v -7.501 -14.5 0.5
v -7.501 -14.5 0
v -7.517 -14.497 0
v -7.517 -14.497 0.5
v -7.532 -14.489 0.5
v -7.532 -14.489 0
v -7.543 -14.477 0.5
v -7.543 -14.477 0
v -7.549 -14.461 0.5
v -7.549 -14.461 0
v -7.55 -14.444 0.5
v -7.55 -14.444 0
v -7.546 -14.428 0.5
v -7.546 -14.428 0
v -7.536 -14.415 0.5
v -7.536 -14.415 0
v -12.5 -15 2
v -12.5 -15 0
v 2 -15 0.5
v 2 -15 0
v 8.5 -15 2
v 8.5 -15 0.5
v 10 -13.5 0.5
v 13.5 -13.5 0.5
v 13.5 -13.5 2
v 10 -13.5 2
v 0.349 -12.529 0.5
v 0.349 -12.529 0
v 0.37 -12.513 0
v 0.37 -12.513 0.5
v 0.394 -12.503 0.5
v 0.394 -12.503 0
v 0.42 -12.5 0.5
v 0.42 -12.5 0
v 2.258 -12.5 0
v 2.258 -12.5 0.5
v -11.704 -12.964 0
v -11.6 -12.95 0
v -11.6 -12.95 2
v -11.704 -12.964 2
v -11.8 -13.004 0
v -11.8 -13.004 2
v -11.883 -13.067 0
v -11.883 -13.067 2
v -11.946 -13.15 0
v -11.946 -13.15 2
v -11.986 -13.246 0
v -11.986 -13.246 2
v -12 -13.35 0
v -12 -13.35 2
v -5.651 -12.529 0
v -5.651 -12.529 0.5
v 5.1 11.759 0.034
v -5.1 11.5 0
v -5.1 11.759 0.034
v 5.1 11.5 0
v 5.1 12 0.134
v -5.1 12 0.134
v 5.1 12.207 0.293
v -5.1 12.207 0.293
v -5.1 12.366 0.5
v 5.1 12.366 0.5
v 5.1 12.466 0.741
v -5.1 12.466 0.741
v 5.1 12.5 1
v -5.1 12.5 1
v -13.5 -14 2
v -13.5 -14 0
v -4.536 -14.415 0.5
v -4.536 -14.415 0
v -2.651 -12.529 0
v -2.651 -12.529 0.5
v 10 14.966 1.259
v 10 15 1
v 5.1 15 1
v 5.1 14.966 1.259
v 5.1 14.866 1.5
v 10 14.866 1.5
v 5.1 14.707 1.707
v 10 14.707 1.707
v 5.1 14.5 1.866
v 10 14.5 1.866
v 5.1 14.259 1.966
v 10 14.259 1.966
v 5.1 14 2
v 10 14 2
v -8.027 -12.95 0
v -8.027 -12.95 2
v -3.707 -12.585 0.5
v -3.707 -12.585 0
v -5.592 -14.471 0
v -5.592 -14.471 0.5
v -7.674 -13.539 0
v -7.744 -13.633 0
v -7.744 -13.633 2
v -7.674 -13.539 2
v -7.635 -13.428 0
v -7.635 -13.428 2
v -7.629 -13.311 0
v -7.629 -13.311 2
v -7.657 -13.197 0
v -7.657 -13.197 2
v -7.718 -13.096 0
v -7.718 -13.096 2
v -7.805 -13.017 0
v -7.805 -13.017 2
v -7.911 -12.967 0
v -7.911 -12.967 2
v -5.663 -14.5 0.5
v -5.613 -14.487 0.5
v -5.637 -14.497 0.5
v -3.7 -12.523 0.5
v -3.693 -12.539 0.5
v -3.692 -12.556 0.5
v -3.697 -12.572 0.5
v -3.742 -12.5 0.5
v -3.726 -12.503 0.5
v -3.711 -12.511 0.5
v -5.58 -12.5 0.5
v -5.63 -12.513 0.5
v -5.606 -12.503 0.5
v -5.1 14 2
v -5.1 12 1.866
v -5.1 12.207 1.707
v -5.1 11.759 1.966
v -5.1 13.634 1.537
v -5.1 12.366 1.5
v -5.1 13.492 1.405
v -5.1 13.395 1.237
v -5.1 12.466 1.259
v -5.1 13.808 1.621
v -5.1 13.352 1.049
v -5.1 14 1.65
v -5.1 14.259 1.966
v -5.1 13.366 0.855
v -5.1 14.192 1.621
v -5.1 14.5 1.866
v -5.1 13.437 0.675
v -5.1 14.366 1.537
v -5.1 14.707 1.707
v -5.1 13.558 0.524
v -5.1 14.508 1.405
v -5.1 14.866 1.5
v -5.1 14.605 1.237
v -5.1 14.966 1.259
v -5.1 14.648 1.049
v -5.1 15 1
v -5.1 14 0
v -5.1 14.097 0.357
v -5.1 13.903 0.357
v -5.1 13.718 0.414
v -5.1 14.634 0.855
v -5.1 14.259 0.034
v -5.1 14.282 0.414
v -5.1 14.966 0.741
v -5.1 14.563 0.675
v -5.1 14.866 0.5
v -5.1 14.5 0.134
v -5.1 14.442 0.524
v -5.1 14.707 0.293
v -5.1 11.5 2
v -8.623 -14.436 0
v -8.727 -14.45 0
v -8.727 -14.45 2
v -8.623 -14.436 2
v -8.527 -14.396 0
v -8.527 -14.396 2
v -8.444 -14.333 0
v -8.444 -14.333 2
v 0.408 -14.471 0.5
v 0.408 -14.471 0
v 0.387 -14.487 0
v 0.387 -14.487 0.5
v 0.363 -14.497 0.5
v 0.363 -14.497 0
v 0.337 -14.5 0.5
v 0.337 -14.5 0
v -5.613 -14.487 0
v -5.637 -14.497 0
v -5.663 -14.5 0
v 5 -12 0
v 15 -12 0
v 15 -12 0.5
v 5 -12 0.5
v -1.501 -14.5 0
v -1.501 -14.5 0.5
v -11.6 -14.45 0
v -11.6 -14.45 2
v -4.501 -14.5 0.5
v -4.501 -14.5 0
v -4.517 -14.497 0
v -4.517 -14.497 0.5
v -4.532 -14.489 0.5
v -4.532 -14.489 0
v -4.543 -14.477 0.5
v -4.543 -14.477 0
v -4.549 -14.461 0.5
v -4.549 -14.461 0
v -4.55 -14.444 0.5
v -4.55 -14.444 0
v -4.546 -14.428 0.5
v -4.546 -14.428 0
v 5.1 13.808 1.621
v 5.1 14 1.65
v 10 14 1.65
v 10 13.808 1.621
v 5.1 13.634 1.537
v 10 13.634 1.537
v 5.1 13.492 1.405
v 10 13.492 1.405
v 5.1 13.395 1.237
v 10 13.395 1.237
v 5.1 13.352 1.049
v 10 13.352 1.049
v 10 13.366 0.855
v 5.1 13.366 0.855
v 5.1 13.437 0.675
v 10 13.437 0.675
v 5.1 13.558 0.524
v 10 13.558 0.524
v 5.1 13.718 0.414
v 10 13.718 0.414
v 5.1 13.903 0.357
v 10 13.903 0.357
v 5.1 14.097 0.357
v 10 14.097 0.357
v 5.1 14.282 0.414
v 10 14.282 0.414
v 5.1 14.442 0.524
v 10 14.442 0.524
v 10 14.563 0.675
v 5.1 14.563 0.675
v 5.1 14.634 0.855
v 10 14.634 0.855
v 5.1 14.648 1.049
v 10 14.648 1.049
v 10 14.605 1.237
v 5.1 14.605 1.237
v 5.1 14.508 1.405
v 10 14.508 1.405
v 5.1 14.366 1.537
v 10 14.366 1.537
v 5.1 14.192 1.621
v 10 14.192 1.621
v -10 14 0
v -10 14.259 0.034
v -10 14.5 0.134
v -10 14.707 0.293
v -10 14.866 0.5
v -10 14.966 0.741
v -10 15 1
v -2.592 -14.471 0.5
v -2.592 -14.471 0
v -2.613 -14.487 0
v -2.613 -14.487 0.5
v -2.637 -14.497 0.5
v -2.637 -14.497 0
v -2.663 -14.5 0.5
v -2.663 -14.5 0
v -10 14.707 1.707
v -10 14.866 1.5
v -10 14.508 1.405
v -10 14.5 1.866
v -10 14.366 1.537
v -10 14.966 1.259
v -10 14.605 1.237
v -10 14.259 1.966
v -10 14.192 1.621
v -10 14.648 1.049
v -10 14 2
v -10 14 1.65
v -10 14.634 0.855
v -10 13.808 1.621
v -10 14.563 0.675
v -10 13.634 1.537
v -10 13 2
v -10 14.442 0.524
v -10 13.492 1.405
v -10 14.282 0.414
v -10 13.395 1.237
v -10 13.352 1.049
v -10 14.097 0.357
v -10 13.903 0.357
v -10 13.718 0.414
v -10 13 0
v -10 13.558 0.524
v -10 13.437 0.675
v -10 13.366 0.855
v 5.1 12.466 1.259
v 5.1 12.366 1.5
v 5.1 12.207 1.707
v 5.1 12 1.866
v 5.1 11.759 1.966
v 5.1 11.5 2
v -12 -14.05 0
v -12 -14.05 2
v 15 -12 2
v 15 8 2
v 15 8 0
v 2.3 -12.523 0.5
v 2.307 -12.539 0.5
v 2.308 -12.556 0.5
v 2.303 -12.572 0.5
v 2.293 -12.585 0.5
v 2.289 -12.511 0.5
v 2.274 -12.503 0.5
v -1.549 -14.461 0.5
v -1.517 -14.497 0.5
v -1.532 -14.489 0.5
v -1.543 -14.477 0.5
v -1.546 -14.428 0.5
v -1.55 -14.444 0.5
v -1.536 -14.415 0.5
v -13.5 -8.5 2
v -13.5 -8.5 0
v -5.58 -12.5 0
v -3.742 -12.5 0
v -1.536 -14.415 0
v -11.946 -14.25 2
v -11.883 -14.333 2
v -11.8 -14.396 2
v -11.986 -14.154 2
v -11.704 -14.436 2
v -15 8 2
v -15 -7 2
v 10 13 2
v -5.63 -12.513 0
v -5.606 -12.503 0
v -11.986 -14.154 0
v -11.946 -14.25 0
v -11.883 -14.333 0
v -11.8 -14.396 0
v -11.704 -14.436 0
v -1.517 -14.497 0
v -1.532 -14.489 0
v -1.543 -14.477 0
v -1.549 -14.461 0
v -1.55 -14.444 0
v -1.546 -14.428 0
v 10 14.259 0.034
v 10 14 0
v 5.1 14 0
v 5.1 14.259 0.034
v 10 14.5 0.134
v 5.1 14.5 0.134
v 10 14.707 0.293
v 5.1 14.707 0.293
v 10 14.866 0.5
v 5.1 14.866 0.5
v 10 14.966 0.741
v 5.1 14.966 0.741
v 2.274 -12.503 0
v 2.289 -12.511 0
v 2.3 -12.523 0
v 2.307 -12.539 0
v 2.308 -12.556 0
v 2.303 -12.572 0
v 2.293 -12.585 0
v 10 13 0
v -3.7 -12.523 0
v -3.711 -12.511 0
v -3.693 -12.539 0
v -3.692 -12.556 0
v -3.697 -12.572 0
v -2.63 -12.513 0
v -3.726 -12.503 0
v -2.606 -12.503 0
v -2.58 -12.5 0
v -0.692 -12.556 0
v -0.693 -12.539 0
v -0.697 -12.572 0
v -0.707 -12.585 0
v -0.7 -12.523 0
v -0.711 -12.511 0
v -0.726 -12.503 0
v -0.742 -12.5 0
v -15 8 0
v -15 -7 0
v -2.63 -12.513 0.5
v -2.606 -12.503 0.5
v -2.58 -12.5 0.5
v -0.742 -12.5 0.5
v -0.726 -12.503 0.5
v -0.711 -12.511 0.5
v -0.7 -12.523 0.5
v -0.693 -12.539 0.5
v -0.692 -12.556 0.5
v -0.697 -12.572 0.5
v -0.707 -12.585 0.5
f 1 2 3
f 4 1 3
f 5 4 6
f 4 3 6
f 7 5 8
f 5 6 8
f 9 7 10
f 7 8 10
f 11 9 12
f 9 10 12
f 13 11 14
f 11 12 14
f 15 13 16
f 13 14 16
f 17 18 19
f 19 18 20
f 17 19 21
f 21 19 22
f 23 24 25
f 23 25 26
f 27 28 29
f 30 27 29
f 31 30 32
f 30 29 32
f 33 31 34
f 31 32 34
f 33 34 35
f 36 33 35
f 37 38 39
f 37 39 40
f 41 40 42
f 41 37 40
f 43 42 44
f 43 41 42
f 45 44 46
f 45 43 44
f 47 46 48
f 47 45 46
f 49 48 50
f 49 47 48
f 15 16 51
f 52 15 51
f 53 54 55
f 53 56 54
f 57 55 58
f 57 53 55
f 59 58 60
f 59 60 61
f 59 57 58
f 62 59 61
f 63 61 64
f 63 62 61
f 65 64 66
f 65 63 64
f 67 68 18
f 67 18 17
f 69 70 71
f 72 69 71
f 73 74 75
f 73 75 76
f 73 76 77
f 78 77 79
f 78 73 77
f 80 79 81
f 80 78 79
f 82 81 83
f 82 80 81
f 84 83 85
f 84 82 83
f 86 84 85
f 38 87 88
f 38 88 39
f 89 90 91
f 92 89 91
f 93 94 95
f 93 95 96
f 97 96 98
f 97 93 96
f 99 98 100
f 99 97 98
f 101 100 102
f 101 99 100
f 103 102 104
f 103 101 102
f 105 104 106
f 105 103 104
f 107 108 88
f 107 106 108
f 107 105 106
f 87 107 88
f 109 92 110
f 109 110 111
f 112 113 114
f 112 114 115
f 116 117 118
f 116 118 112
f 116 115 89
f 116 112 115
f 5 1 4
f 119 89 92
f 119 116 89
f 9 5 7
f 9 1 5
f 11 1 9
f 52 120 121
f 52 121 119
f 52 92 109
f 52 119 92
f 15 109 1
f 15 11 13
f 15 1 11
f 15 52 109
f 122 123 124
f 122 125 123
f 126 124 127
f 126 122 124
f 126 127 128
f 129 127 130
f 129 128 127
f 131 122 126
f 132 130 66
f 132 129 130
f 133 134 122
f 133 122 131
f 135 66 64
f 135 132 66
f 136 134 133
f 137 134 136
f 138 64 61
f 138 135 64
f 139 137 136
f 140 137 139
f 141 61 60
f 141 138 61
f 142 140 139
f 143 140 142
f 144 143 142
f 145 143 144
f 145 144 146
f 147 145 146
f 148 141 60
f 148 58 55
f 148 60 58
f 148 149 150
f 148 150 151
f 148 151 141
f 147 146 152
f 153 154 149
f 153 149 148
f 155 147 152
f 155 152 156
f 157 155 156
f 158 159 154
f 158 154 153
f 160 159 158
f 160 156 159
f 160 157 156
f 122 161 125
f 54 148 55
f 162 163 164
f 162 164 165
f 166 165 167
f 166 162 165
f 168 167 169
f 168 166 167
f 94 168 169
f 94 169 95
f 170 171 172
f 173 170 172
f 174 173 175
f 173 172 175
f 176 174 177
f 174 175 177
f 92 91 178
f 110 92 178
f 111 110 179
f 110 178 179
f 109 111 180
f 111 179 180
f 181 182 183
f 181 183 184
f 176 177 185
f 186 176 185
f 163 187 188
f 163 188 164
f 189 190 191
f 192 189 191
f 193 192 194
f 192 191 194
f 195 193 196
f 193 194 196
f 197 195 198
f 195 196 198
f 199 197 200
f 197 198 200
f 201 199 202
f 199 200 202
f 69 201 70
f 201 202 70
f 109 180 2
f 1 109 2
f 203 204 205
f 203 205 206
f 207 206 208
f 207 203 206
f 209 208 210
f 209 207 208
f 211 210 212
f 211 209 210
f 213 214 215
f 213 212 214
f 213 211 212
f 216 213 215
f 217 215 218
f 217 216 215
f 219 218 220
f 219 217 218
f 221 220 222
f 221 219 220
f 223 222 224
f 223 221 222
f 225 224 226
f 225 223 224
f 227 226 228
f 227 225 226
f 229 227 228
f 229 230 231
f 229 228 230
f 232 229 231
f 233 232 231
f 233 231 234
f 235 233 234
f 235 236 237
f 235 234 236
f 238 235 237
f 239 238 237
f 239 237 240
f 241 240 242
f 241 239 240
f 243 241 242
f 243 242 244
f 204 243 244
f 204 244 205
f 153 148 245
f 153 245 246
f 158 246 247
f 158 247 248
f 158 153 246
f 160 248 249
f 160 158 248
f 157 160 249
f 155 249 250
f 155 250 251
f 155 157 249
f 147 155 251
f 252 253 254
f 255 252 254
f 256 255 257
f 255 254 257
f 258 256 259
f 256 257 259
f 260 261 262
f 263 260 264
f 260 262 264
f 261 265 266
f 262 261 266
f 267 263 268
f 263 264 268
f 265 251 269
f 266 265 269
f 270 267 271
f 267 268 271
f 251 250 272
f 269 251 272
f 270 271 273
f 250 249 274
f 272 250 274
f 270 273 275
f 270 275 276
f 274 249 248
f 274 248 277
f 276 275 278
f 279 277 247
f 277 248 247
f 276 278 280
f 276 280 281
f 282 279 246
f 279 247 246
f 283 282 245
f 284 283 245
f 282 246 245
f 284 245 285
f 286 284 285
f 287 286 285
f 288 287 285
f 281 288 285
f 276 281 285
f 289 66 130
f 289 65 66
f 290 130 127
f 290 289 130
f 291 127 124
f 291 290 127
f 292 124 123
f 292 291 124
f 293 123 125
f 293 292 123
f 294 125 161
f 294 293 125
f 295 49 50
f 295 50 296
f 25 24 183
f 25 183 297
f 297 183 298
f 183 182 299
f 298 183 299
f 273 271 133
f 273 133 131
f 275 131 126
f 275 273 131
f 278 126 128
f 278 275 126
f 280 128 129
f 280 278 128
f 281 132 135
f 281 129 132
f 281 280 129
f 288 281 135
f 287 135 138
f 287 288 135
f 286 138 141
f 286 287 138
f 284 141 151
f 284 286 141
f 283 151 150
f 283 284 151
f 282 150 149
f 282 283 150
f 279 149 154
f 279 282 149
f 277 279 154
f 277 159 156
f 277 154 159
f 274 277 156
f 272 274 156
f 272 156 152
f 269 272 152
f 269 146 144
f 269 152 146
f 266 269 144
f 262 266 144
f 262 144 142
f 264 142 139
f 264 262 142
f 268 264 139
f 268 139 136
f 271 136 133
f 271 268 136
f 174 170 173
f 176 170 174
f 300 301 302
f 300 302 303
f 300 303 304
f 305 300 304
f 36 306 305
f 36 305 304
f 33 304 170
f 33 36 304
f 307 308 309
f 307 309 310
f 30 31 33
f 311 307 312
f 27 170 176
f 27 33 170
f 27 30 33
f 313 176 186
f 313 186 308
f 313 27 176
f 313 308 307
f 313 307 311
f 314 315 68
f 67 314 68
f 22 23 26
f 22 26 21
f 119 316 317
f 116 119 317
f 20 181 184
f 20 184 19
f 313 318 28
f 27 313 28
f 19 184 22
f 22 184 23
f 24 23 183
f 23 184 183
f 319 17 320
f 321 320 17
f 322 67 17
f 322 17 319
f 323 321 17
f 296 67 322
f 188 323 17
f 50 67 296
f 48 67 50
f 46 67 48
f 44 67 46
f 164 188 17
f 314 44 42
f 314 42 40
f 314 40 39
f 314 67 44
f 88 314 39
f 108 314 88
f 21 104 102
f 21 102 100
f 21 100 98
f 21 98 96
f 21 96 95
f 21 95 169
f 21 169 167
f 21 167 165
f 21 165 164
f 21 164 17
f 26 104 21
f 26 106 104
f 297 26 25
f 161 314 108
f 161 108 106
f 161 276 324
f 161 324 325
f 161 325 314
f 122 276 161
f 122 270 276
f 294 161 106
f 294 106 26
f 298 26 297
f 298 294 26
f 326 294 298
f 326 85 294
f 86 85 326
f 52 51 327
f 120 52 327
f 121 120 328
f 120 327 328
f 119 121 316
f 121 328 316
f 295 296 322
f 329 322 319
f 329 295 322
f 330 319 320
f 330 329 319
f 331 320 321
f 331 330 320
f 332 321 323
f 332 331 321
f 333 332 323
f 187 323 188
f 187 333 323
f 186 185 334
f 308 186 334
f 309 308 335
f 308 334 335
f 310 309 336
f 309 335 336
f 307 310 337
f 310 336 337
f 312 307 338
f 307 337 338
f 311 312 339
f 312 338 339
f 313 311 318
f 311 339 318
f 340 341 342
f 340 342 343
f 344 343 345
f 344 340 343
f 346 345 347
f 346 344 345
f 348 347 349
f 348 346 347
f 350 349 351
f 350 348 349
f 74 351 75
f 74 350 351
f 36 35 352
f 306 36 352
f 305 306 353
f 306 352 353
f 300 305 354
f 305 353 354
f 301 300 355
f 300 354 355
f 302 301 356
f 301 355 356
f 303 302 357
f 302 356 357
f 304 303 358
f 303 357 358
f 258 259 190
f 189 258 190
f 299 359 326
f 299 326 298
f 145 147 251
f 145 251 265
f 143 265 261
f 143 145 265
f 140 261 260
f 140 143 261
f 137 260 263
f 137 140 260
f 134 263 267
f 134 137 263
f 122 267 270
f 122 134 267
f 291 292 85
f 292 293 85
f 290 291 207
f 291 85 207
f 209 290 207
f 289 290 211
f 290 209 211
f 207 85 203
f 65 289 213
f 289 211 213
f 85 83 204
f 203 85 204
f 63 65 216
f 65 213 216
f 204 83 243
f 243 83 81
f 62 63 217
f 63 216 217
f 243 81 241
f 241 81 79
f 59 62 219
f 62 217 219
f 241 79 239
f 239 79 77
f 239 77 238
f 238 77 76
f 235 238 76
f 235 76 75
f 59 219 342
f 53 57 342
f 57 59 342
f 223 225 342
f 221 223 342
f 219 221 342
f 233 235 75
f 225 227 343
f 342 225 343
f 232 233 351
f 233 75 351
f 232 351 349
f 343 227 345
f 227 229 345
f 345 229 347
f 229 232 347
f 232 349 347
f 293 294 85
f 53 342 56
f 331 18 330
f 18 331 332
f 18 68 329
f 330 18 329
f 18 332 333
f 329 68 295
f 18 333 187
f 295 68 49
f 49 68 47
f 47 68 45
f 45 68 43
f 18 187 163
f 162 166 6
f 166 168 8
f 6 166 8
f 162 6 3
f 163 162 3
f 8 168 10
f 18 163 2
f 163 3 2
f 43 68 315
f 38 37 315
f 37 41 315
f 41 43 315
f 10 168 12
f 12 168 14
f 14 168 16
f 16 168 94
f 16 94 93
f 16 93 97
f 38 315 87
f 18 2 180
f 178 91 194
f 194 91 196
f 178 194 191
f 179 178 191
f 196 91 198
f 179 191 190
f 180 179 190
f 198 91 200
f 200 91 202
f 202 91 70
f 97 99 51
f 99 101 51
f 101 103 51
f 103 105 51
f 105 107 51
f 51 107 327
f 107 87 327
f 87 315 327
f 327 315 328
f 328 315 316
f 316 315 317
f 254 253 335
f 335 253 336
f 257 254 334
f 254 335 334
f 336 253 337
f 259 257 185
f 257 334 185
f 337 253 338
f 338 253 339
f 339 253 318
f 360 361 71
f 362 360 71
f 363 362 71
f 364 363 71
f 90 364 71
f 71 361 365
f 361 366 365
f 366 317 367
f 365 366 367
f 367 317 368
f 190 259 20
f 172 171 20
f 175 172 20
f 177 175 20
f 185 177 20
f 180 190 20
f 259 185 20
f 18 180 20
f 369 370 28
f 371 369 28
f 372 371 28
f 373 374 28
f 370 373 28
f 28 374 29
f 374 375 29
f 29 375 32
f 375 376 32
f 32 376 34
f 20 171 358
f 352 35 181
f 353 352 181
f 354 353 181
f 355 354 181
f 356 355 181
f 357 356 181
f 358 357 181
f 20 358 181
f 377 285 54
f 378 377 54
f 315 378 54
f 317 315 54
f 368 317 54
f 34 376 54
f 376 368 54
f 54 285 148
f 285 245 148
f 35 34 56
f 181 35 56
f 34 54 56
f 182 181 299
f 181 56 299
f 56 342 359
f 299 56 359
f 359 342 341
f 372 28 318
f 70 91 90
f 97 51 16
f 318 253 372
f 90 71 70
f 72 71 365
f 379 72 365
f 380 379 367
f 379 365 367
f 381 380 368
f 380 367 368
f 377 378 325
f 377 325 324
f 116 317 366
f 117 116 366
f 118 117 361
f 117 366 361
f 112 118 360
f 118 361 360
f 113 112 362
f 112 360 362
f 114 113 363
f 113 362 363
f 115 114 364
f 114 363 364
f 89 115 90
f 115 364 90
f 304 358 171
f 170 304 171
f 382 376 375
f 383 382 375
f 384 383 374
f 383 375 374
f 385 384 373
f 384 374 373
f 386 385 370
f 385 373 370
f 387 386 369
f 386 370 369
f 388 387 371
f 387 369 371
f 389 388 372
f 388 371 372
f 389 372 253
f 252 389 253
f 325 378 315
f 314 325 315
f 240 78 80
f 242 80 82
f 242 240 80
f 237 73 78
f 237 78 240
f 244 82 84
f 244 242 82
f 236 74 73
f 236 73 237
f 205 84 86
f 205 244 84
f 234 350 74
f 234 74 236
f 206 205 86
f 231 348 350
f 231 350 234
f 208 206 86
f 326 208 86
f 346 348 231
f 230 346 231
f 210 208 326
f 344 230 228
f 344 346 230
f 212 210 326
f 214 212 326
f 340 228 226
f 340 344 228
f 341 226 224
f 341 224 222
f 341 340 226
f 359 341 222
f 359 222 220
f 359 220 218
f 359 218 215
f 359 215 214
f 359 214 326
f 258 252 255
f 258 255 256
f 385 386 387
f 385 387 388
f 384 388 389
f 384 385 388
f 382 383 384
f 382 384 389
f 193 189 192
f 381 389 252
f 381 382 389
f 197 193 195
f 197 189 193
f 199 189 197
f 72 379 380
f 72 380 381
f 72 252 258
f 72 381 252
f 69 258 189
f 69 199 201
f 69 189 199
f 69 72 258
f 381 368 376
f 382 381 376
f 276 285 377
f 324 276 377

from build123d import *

# Parameters (mm, degrees)
SKETCH_1_W               = 30
SKETCH_1_H               = 30
EXTRUDE_1_DEPTH          = 2
SKETCH_2_W               = 10.2
SKETCH_2_H               = 2
CUT_EXTRUDE_1_DEPTH      = 2.5
CUT_EXTRUDE_3_DEPTH      = 43
CHAMFER_1_SIZE           = 1.5
CUT_EXTRUDE_4_DEPTH      = 0.5
FILLET_1_R               = 1
CUT_EXTRUDE_2_DEPTH      = 43
CUT_EXTRUDE_2_DEPTH_BACK = 43
SKETCH_3_R               = 0.65
CUT_EXTRUDE_7_DEPTH      = 0.5
CUT_EXTRUDE_8_DEPTH      = 10
CUT_EXTRUDE_9_DEPTH      = 10
CHAMFER_2_SIZE           = 1
CUT_EXTRUDE_10_DEPTH     = 10


with BuildPart() as part:
    # 草图1 → 凸台-拉伸1 (new body)
    with BuildSketch(Plane.XY):
        Rectangle(SKETCH_1_W, SKETCH_1_H)
    extrude(amount=EXTRUDE_1_DEPTH)

    # 草图2 → 切除-拉伸1 (cut)
    with BuildSketch(Plane(origin=(0, 15, 0), x_dir=(1, 0, 0), z_dir=(0, 1, 0))):
        with Locations((0, -1)):
            Rectangle(SKETCH_2_W, SKETCH_2_H)
    extrude(amount=-CUT_EXTRUDE_1_DEPTH, mode=Mode.SUBTRACT)

    # 草图4 → 切除-拉伸3 (cut)
    with BuildSketch(Plane(origin=(0, 0, 0), x_dir=(-1, 0, 0), z_dir=(0, 0, -1))):
        Polygon((-10, -13.5), (-8.5, -15), (-10, -15), (-15, -15), (-15, -13.5), align=None)
    extrude(amount=-CUT_EXTRUDE_3_DEPTH, mode=Mode.SUBTRACT)

    # 倒角1
    chamfer_1_edges = [part.edges().sort_by_distance(p)[0] for p in [
        (15, -13.5, 1),
    ]]
    chamfer(chamfer_1_edges, length=CHAMFER_1_SIZE)

    # 草图5 → 切除-拉伸4 (cut)
    with BuildSketch(Plane(origin=(0, 0, 0), x_dir=(-1, 0, 0), z_dir=(0, 0, -1))):
        Polygon((-15, -12), (-5, -12), (-2, -15), (-8.5, -15), (-10, -13.5), (-13.5, -13.5), align=None)
    extrude(amount=-CUT_EXTRUDE_4_DEPTH, mode=Mode.SUBTRACT)

    # 圆角1
    fillet_1_edges = [part.edges().sort_by_distance(p)[0] for p in [
        (10.05, 15, 2),
        (10.05, 15, 0),
        (-10.05, 15, 2),
        (-10.05, 15, 0),
        (0, 12.5, 2),
        (0, 12.5, 0),
    ]]
    fillet(fillet_1_edges, radius=FILLET_1_R - 0.0001)  # a hair under: the kernel refuses the full size

    # 草图3 → 切除-拉伸2 (cut, two sides: drawn at the far end of the back side and taken through both)
    with BuildSketch(Plane(origin=(-5.1, 0, 0), x_dir=(0, 0, -1), z_dir=(1, 0, 0)).offset(-CUT_EXTRUDE_2_DEPTH_BACK)):
        with Locations(Location((-1, 14, 0), (0, 0, 180))):
            Circle(SKETCH_3_R)
    extrude(amount=CUT_EXTRUDE_2_DEPTH + CUT_EXTRUDE_2_DEPTH_BACK, mode=Mode.SUBTRACT)

    # 草图9 → 切除-拉伸7 (cut)
    with BuildSketch(Plane(origin=(0, 0, 0), x_dir=(-1, 0, 0), z_dir=(0, 0, -1))):
        with BuildLine():
            Line((-2.293324317, -12.585355339), (-0.407968978, -14.470710678))
            ThreePointArc((-0.407968978, -14.470710678), (-0.375526643, -14.492387953), (-0.3372583, -14.5))
            Line((-0.3372583, -14.5), (1.500609665, -14.5))
            ThreePointArc((1.500609665, -14.5), (1.546803642, -14.469134172), (1.535965005, -14.414644661))
            Line((1.535965005, -14.414644661), (-0.349390335, -12.529289322))
            ThreePointArc((-0.349390335, -12.529289322), (-0.381832669, -12.507612047), (-0.420101013, -12.5))
            Line((-0.420101013, -12.5), (-2.257968978, -12.5))
            ThreePointArc((-2.257968978, -12.5), (-2.304162955, -12.530865828), (-2.293324317, -12.585355339))
        make_face()
        with BuildLine():
            Line((2.579898987, -12.5), (0.742031022, -12.5))
            ThreePointArc((0.742031022, -12.5), (0.695837045, -12.530865828), (0.706675683, -12.585355339))
            Line((0.706675683, -12.585355339), (2.592031022, -14.470710678))
            ThreePointArc((2.592031022, -14.470710678), (2.624473357, -14.492387953), (2.6627417, -14.5))
            Line((2.6627417, -14.5), (4.500609665, -14.5))
            ThreePointArc((4.500609665, -14.5), (4.546803642, -14.469134172), (4.535965005, -14.414644661))
            Line((4.535965005, -14.414644661), (2.650609665, -12.529289322))
            ThreePointArc((2.650609665, -12.529289322), (2.618167331, -12.507612047), (2.579898987, -12.5))
        make_face()
        with BuildLine():
            Line((5.579898987, -12.5), (3.742031022, -12.5))
            ThreePointArc((3.742031022, -12.5), (3.695837045, -12.530865828), (3.706675683, -12.585355339))
            Line((3.706675683, -12.585355339), (5.592031022, -14.470710678))
            ThreePointArc((5.592031022, -14.470710678), (5.624473357, -14.492387953), (5.6627417, -14.5))
            Line((5.6627417, -14.5), (7.500609665, -14.5))
            ThreePointArc((7.500609665, -14.5), (7.546803642, -14.469134172), (7.535965005, -14.414644661))
            Line((7.535965005, -14.414644661), (5.650609665, -12.529289322))
            ThreePointArc((5.650609665, -12.529289322), (5.618167331, -12.507612047), (5.579898987, -12.5))
        make_face()
    extrude(amount=-CUT_EXTRUDE_7_DEPTH, mode=Mode.SUBTRACT)

    # 草图10 → 切除-拉伸8 (cut)
    with BuildSketch(Plane(origin=(0, 0, 0), x_dir=(-1, 0, 0), z_dir=(0, 0, -1))):
        with BuildLine():
            Line((8.026955262, -12.95), (11.6, -12.95))
            ThreePointArc((11.6, -12.95), (11.882842712, -13.067157288), (12, -13.35))
            Line((12, -13.35), (12, -14.05))
            ThreePointArc((12, -14.05), (11.882842712, -14.332842712), (11.6, -14.45))
            Line((11.6, -14.45), (8.726955262, -14.45))
            ThreePointArc((8.726955262, -14.45), (8.573881889, -14.419551813), (8.44411255, -14.332842712))
            Line((8.44411255, -14.332842712), (7.74411255, -13.632842712))
            ThreePointArc((7.74411255, -13.632842712), (7.657403449, -13.196926627), (8.026955262, -12.95))
        make_face()
    extrude(amount=-CUT_EXTRUDE_8_DEPTH, mode=Mode.SUBTRACT)

    # 草图11 → 切除-拉伸9 (cut)
    with BuildSketch(Plane(origin=(0, 0, 0), x_dir=(-1, 0, 0), z_dir=(0, 0, -1))):
        Polygon((15, -7), (13.5, -8.5), (13.5, -15), (15, -15), align=None)
    extrude(amount=-CUT_EXTRUDE_9_DEPTH, mode=Mode.SUBTRACT)

    # 倒角2
    chamfer_2_edges = [part.edges().sort_by_distance(p)[0] for p in [
        (-13.5, -15, 1),
    ]]
    chamfer(chamfer_2_edges, length=CHAMFER_2_SIZE)

    # 草图12 → 切除-拉伸10 (cut)
    with BuildSketch(Plane(origin=(0, 0, 0), x_dir=(-1, 0, 0), z_dir=(0, 0, -1))):
        Polygon((10, 15), (10, 13), (13, 10), (15, 8), (15, 15), align=None)
    cut_extrude_10 = extrude(amount=-CUT_EXTRUDE_10_DEPTH, mode=Mode.SUBTRACT)

    # 镜向4: 切除-拉伸10 across plane
    add(cut_extrude_10.mirror(Plane(origin=(0, 0, 0), x_dir=(0, 0, 1), z_dir=(1, 0, 0))), mode=Mode.SUBTRACT)


solid = part.part
